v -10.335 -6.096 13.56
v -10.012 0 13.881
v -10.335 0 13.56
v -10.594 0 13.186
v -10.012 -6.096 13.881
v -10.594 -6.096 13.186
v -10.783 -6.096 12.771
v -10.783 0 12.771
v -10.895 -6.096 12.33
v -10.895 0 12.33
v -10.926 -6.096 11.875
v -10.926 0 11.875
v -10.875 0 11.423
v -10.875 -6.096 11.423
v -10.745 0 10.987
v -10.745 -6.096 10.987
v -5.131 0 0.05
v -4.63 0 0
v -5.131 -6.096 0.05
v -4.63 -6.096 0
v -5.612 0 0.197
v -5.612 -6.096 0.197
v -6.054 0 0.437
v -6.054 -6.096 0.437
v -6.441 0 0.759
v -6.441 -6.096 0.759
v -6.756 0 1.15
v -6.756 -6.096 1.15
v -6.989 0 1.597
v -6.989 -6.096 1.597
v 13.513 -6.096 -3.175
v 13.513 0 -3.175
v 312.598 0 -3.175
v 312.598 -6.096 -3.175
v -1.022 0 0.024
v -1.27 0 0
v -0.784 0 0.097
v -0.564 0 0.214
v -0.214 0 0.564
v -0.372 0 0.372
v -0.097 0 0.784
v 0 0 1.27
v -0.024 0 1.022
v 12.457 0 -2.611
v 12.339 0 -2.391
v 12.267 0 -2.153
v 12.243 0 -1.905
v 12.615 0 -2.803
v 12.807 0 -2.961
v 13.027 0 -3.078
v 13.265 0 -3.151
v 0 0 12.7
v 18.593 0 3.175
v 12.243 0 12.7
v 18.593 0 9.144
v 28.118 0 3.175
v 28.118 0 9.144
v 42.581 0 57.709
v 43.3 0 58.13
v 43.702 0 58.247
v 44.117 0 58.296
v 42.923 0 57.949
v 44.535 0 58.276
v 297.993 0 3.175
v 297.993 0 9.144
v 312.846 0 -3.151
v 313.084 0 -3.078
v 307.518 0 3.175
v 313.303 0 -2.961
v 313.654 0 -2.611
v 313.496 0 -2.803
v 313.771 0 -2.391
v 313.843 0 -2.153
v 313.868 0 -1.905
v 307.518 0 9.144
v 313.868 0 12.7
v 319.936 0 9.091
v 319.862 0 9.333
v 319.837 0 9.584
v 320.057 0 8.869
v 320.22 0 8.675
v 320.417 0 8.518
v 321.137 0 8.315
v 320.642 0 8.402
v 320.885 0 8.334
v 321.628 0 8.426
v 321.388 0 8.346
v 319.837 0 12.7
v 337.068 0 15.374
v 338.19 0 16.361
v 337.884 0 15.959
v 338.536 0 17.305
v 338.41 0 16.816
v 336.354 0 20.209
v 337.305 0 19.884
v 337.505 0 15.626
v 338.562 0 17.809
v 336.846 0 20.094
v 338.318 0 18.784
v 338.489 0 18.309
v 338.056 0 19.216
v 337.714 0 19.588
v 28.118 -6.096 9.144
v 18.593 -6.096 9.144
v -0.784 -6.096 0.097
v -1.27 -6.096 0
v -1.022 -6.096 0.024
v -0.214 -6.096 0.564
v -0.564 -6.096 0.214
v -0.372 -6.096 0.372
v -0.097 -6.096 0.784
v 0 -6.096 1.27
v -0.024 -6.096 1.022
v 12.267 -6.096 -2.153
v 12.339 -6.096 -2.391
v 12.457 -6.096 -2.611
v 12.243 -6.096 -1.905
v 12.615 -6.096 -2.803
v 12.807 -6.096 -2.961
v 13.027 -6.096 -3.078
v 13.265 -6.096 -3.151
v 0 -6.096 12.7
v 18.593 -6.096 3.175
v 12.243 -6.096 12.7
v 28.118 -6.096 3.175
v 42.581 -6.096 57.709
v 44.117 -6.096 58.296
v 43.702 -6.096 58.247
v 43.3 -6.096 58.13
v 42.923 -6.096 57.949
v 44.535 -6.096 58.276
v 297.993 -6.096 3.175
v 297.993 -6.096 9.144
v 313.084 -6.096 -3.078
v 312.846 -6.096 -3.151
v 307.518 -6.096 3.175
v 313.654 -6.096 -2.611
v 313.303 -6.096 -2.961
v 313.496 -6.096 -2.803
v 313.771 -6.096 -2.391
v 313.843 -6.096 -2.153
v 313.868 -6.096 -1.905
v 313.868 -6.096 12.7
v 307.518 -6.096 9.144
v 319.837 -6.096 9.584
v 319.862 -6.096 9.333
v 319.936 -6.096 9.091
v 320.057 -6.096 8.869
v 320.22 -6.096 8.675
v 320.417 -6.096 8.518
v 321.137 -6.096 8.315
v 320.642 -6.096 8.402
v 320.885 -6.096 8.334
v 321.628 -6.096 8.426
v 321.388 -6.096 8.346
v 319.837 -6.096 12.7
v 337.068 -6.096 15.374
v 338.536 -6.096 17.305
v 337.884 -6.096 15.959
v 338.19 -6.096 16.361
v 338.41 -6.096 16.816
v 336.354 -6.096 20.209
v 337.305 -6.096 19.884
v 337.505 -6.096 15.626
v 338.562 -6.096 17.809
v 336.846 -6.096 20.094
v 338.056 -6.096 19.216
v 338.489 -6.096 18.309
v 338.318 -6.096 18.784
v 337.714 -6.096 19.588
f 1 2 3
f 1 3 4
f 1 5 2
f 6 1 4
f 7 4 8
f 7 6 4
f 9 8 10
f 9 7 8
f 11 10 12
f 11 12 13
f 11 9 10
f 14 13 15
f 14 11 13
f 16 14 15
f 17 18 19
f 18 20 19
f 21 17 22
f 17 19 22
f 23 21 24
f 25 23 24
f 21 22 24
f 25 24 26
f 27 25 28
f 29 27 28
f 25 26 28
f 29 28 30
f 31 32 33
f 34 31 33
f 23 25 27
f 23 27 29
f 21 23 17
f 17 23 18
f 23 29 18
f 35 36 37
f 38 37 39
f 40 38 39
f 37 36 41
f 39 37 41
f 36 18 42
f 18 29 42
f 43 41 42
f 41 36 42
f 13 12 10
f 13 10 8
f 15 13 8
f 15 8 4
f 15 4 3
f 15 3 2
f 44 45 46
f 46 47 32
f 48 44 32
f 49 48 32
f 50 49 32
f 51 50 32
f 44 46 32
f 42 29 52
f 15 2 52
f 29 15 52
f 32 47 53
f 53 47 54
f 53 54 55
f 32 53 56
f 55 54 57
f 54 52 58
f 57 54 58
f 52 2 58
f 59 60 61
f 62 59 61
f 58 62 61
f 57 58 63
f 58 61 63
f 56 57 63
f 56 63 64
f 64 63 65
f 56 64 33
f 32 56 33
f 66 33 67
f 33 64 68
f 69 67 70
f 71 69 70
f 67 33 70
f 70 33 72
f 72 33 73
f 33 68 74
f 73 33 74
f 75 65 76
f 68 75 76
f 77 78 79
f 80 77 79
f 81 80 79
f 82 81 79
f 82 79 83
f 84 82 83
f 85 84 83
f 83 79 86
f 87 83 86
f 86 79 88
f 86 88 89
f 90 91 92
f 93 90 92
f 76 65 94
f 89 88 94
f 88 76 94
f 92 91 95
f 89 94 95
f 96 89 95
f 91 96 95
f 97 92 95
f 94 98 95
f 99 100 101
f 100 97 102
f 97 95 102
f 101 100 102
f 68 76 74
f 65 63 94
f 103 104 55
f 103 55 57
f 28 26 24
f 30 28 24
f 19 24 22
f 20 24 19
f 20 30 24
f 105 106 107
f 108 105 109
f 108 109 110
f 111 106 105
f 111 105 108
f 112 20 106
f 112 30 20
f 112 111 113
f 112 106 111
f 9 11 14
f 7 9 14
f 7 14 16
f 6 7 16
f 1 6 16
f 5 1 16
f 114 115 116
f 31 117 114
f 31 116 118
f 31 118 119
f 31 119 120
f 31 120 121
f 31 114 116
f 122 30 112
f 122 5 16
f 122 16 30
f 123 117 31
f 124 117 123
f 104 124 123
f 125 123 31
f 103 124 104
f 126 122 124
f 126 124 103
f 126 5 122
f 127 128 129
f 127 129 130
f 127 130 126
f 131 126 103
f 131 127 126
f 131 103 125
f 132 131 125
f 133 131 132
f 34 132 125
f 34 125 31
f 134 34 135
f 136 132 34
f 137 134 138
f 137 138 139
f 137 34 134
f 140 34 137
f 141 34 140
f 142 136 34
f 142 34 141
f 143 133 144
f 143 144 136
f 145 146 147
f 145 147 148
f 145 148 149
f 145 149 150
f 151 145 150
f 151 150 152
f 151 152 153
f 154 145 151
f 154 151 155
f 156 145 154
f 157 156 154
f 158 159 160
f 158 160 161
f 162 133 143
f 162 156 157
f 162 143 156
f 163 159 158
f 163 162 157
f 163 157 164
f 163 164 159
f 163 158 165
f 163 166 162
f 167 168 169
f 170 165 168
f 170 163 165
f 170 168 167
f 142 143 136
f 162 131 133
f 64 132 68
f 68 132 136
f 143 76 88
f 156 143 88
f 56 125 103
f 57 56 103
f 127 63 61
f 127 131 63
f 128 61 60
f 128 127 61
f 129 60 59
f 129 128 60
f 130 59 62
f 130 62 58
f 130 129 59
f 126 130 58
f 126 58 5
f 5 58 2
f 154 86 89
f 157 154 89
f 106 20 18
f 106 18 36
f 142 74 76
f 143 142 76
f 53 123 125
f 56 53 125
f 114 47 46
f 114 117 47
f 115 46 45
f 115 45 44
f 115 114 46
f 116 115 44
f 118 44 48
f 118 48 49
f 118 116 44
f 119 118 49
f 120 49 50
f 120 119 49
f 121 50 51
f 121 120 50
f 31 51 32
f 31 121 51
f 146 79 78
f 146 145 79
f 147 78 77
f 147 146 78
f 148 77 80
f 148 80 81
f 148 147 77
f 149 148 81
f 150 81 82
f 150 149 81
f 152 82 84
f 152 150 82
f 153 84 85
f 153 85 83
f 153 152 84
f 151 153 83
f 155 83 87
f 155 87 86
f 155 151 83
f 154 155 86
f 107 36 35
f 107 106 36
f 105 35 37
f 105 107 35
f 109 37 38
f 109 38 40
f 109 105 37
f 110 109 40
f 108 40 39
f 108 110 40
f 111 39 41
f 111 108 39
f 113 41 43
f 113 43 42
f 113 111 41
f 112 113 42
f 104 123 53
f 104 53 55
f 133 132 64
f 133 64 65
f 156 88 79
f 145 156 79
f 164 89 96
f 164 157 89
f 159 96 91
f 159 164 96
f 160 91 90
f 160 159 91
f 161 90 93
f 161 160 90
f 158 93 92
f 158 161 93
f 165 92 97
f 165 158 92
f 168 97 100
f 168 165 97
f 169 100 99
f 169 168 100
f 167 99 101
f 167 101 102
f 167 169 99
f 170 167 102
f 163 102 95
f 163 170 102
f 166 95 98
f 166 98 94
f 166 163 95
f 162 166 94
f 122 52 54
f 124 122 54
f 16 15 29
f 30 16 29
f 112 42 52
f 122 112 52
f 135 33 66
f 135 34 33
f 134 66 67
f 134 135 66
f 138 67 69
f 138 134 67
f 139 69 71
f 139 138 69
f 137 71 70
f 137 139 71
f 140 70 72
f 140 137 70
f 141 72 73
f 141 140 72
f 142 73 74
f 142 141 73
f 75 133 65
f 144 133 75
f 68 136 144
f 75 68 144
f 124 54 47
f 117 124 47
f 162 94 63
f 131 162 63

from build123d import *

# Parameters (mm, degrees)
F1_DEPTH = 6.096
F4_R     = 2.54
F5_R     = 1.27
F6_W     = 9.525
F6_H     = 5.969
F7_DEPTH = 6.097


# Not quite as in the source:
# - a feature of the source that left no trace in its solid (it failed there, or was rolled back) is left out


with BuildPart() as f1:
    # F0 (on Front) → F1 (new body)
    with BuildSketch(Plane.XZ):
        Polygon((-6.35, 0), (0, 0), (0, 12.7), (12.2428, 12.7), (12.2428, -3.175), (313.8678, -3.175), (313.8678, 12.7), (319.8368, 12.7), (319.8368, 7.62), (345.2368, 19.05), (43.434, 58.42), (0, 22.225), (-11.43, 12.7), align=None)
    extrude(amount=F1_DEPTH)

    # F4
    f4_edges = [f1.edges().sort_by_distance(p)[0] for p in [
        (43.434, -3.048, 58.42),
        (-11.43, -3.048, 12.7),
        (-6.35, -3.048, 0),
        (345.2368, -3.048, 19.05),
    ]]
    fillet(f4_edges, radius=F4_R)

    # F5
    f5_edges = [f1.edges().sort_by_distance(p)[0] for p in [
        (0, -3.048, 0),
        (12.2428, -3.048, -3.175),
        (319.8368, -3.048, 7.62),
        (313.8678, -3.048, -3.175),
    ]]
    fillet(f5_edges, radius=F5_R)

    # F6 (on face) → F7 (cut, through all)
    with BuildSketch(Plane.XZ.offset(6.096)):
        with Locations((23.3553, 6.1595)):
            Rectangle(F6_W, F6_H)
        with Locations((302.7553, 6.1595)):
            Rectangle(F6_W, F6_H)
    extrude(amount=-F7_DEPTH, mode=Mode.SUBTRACT)


solid = f1.part
